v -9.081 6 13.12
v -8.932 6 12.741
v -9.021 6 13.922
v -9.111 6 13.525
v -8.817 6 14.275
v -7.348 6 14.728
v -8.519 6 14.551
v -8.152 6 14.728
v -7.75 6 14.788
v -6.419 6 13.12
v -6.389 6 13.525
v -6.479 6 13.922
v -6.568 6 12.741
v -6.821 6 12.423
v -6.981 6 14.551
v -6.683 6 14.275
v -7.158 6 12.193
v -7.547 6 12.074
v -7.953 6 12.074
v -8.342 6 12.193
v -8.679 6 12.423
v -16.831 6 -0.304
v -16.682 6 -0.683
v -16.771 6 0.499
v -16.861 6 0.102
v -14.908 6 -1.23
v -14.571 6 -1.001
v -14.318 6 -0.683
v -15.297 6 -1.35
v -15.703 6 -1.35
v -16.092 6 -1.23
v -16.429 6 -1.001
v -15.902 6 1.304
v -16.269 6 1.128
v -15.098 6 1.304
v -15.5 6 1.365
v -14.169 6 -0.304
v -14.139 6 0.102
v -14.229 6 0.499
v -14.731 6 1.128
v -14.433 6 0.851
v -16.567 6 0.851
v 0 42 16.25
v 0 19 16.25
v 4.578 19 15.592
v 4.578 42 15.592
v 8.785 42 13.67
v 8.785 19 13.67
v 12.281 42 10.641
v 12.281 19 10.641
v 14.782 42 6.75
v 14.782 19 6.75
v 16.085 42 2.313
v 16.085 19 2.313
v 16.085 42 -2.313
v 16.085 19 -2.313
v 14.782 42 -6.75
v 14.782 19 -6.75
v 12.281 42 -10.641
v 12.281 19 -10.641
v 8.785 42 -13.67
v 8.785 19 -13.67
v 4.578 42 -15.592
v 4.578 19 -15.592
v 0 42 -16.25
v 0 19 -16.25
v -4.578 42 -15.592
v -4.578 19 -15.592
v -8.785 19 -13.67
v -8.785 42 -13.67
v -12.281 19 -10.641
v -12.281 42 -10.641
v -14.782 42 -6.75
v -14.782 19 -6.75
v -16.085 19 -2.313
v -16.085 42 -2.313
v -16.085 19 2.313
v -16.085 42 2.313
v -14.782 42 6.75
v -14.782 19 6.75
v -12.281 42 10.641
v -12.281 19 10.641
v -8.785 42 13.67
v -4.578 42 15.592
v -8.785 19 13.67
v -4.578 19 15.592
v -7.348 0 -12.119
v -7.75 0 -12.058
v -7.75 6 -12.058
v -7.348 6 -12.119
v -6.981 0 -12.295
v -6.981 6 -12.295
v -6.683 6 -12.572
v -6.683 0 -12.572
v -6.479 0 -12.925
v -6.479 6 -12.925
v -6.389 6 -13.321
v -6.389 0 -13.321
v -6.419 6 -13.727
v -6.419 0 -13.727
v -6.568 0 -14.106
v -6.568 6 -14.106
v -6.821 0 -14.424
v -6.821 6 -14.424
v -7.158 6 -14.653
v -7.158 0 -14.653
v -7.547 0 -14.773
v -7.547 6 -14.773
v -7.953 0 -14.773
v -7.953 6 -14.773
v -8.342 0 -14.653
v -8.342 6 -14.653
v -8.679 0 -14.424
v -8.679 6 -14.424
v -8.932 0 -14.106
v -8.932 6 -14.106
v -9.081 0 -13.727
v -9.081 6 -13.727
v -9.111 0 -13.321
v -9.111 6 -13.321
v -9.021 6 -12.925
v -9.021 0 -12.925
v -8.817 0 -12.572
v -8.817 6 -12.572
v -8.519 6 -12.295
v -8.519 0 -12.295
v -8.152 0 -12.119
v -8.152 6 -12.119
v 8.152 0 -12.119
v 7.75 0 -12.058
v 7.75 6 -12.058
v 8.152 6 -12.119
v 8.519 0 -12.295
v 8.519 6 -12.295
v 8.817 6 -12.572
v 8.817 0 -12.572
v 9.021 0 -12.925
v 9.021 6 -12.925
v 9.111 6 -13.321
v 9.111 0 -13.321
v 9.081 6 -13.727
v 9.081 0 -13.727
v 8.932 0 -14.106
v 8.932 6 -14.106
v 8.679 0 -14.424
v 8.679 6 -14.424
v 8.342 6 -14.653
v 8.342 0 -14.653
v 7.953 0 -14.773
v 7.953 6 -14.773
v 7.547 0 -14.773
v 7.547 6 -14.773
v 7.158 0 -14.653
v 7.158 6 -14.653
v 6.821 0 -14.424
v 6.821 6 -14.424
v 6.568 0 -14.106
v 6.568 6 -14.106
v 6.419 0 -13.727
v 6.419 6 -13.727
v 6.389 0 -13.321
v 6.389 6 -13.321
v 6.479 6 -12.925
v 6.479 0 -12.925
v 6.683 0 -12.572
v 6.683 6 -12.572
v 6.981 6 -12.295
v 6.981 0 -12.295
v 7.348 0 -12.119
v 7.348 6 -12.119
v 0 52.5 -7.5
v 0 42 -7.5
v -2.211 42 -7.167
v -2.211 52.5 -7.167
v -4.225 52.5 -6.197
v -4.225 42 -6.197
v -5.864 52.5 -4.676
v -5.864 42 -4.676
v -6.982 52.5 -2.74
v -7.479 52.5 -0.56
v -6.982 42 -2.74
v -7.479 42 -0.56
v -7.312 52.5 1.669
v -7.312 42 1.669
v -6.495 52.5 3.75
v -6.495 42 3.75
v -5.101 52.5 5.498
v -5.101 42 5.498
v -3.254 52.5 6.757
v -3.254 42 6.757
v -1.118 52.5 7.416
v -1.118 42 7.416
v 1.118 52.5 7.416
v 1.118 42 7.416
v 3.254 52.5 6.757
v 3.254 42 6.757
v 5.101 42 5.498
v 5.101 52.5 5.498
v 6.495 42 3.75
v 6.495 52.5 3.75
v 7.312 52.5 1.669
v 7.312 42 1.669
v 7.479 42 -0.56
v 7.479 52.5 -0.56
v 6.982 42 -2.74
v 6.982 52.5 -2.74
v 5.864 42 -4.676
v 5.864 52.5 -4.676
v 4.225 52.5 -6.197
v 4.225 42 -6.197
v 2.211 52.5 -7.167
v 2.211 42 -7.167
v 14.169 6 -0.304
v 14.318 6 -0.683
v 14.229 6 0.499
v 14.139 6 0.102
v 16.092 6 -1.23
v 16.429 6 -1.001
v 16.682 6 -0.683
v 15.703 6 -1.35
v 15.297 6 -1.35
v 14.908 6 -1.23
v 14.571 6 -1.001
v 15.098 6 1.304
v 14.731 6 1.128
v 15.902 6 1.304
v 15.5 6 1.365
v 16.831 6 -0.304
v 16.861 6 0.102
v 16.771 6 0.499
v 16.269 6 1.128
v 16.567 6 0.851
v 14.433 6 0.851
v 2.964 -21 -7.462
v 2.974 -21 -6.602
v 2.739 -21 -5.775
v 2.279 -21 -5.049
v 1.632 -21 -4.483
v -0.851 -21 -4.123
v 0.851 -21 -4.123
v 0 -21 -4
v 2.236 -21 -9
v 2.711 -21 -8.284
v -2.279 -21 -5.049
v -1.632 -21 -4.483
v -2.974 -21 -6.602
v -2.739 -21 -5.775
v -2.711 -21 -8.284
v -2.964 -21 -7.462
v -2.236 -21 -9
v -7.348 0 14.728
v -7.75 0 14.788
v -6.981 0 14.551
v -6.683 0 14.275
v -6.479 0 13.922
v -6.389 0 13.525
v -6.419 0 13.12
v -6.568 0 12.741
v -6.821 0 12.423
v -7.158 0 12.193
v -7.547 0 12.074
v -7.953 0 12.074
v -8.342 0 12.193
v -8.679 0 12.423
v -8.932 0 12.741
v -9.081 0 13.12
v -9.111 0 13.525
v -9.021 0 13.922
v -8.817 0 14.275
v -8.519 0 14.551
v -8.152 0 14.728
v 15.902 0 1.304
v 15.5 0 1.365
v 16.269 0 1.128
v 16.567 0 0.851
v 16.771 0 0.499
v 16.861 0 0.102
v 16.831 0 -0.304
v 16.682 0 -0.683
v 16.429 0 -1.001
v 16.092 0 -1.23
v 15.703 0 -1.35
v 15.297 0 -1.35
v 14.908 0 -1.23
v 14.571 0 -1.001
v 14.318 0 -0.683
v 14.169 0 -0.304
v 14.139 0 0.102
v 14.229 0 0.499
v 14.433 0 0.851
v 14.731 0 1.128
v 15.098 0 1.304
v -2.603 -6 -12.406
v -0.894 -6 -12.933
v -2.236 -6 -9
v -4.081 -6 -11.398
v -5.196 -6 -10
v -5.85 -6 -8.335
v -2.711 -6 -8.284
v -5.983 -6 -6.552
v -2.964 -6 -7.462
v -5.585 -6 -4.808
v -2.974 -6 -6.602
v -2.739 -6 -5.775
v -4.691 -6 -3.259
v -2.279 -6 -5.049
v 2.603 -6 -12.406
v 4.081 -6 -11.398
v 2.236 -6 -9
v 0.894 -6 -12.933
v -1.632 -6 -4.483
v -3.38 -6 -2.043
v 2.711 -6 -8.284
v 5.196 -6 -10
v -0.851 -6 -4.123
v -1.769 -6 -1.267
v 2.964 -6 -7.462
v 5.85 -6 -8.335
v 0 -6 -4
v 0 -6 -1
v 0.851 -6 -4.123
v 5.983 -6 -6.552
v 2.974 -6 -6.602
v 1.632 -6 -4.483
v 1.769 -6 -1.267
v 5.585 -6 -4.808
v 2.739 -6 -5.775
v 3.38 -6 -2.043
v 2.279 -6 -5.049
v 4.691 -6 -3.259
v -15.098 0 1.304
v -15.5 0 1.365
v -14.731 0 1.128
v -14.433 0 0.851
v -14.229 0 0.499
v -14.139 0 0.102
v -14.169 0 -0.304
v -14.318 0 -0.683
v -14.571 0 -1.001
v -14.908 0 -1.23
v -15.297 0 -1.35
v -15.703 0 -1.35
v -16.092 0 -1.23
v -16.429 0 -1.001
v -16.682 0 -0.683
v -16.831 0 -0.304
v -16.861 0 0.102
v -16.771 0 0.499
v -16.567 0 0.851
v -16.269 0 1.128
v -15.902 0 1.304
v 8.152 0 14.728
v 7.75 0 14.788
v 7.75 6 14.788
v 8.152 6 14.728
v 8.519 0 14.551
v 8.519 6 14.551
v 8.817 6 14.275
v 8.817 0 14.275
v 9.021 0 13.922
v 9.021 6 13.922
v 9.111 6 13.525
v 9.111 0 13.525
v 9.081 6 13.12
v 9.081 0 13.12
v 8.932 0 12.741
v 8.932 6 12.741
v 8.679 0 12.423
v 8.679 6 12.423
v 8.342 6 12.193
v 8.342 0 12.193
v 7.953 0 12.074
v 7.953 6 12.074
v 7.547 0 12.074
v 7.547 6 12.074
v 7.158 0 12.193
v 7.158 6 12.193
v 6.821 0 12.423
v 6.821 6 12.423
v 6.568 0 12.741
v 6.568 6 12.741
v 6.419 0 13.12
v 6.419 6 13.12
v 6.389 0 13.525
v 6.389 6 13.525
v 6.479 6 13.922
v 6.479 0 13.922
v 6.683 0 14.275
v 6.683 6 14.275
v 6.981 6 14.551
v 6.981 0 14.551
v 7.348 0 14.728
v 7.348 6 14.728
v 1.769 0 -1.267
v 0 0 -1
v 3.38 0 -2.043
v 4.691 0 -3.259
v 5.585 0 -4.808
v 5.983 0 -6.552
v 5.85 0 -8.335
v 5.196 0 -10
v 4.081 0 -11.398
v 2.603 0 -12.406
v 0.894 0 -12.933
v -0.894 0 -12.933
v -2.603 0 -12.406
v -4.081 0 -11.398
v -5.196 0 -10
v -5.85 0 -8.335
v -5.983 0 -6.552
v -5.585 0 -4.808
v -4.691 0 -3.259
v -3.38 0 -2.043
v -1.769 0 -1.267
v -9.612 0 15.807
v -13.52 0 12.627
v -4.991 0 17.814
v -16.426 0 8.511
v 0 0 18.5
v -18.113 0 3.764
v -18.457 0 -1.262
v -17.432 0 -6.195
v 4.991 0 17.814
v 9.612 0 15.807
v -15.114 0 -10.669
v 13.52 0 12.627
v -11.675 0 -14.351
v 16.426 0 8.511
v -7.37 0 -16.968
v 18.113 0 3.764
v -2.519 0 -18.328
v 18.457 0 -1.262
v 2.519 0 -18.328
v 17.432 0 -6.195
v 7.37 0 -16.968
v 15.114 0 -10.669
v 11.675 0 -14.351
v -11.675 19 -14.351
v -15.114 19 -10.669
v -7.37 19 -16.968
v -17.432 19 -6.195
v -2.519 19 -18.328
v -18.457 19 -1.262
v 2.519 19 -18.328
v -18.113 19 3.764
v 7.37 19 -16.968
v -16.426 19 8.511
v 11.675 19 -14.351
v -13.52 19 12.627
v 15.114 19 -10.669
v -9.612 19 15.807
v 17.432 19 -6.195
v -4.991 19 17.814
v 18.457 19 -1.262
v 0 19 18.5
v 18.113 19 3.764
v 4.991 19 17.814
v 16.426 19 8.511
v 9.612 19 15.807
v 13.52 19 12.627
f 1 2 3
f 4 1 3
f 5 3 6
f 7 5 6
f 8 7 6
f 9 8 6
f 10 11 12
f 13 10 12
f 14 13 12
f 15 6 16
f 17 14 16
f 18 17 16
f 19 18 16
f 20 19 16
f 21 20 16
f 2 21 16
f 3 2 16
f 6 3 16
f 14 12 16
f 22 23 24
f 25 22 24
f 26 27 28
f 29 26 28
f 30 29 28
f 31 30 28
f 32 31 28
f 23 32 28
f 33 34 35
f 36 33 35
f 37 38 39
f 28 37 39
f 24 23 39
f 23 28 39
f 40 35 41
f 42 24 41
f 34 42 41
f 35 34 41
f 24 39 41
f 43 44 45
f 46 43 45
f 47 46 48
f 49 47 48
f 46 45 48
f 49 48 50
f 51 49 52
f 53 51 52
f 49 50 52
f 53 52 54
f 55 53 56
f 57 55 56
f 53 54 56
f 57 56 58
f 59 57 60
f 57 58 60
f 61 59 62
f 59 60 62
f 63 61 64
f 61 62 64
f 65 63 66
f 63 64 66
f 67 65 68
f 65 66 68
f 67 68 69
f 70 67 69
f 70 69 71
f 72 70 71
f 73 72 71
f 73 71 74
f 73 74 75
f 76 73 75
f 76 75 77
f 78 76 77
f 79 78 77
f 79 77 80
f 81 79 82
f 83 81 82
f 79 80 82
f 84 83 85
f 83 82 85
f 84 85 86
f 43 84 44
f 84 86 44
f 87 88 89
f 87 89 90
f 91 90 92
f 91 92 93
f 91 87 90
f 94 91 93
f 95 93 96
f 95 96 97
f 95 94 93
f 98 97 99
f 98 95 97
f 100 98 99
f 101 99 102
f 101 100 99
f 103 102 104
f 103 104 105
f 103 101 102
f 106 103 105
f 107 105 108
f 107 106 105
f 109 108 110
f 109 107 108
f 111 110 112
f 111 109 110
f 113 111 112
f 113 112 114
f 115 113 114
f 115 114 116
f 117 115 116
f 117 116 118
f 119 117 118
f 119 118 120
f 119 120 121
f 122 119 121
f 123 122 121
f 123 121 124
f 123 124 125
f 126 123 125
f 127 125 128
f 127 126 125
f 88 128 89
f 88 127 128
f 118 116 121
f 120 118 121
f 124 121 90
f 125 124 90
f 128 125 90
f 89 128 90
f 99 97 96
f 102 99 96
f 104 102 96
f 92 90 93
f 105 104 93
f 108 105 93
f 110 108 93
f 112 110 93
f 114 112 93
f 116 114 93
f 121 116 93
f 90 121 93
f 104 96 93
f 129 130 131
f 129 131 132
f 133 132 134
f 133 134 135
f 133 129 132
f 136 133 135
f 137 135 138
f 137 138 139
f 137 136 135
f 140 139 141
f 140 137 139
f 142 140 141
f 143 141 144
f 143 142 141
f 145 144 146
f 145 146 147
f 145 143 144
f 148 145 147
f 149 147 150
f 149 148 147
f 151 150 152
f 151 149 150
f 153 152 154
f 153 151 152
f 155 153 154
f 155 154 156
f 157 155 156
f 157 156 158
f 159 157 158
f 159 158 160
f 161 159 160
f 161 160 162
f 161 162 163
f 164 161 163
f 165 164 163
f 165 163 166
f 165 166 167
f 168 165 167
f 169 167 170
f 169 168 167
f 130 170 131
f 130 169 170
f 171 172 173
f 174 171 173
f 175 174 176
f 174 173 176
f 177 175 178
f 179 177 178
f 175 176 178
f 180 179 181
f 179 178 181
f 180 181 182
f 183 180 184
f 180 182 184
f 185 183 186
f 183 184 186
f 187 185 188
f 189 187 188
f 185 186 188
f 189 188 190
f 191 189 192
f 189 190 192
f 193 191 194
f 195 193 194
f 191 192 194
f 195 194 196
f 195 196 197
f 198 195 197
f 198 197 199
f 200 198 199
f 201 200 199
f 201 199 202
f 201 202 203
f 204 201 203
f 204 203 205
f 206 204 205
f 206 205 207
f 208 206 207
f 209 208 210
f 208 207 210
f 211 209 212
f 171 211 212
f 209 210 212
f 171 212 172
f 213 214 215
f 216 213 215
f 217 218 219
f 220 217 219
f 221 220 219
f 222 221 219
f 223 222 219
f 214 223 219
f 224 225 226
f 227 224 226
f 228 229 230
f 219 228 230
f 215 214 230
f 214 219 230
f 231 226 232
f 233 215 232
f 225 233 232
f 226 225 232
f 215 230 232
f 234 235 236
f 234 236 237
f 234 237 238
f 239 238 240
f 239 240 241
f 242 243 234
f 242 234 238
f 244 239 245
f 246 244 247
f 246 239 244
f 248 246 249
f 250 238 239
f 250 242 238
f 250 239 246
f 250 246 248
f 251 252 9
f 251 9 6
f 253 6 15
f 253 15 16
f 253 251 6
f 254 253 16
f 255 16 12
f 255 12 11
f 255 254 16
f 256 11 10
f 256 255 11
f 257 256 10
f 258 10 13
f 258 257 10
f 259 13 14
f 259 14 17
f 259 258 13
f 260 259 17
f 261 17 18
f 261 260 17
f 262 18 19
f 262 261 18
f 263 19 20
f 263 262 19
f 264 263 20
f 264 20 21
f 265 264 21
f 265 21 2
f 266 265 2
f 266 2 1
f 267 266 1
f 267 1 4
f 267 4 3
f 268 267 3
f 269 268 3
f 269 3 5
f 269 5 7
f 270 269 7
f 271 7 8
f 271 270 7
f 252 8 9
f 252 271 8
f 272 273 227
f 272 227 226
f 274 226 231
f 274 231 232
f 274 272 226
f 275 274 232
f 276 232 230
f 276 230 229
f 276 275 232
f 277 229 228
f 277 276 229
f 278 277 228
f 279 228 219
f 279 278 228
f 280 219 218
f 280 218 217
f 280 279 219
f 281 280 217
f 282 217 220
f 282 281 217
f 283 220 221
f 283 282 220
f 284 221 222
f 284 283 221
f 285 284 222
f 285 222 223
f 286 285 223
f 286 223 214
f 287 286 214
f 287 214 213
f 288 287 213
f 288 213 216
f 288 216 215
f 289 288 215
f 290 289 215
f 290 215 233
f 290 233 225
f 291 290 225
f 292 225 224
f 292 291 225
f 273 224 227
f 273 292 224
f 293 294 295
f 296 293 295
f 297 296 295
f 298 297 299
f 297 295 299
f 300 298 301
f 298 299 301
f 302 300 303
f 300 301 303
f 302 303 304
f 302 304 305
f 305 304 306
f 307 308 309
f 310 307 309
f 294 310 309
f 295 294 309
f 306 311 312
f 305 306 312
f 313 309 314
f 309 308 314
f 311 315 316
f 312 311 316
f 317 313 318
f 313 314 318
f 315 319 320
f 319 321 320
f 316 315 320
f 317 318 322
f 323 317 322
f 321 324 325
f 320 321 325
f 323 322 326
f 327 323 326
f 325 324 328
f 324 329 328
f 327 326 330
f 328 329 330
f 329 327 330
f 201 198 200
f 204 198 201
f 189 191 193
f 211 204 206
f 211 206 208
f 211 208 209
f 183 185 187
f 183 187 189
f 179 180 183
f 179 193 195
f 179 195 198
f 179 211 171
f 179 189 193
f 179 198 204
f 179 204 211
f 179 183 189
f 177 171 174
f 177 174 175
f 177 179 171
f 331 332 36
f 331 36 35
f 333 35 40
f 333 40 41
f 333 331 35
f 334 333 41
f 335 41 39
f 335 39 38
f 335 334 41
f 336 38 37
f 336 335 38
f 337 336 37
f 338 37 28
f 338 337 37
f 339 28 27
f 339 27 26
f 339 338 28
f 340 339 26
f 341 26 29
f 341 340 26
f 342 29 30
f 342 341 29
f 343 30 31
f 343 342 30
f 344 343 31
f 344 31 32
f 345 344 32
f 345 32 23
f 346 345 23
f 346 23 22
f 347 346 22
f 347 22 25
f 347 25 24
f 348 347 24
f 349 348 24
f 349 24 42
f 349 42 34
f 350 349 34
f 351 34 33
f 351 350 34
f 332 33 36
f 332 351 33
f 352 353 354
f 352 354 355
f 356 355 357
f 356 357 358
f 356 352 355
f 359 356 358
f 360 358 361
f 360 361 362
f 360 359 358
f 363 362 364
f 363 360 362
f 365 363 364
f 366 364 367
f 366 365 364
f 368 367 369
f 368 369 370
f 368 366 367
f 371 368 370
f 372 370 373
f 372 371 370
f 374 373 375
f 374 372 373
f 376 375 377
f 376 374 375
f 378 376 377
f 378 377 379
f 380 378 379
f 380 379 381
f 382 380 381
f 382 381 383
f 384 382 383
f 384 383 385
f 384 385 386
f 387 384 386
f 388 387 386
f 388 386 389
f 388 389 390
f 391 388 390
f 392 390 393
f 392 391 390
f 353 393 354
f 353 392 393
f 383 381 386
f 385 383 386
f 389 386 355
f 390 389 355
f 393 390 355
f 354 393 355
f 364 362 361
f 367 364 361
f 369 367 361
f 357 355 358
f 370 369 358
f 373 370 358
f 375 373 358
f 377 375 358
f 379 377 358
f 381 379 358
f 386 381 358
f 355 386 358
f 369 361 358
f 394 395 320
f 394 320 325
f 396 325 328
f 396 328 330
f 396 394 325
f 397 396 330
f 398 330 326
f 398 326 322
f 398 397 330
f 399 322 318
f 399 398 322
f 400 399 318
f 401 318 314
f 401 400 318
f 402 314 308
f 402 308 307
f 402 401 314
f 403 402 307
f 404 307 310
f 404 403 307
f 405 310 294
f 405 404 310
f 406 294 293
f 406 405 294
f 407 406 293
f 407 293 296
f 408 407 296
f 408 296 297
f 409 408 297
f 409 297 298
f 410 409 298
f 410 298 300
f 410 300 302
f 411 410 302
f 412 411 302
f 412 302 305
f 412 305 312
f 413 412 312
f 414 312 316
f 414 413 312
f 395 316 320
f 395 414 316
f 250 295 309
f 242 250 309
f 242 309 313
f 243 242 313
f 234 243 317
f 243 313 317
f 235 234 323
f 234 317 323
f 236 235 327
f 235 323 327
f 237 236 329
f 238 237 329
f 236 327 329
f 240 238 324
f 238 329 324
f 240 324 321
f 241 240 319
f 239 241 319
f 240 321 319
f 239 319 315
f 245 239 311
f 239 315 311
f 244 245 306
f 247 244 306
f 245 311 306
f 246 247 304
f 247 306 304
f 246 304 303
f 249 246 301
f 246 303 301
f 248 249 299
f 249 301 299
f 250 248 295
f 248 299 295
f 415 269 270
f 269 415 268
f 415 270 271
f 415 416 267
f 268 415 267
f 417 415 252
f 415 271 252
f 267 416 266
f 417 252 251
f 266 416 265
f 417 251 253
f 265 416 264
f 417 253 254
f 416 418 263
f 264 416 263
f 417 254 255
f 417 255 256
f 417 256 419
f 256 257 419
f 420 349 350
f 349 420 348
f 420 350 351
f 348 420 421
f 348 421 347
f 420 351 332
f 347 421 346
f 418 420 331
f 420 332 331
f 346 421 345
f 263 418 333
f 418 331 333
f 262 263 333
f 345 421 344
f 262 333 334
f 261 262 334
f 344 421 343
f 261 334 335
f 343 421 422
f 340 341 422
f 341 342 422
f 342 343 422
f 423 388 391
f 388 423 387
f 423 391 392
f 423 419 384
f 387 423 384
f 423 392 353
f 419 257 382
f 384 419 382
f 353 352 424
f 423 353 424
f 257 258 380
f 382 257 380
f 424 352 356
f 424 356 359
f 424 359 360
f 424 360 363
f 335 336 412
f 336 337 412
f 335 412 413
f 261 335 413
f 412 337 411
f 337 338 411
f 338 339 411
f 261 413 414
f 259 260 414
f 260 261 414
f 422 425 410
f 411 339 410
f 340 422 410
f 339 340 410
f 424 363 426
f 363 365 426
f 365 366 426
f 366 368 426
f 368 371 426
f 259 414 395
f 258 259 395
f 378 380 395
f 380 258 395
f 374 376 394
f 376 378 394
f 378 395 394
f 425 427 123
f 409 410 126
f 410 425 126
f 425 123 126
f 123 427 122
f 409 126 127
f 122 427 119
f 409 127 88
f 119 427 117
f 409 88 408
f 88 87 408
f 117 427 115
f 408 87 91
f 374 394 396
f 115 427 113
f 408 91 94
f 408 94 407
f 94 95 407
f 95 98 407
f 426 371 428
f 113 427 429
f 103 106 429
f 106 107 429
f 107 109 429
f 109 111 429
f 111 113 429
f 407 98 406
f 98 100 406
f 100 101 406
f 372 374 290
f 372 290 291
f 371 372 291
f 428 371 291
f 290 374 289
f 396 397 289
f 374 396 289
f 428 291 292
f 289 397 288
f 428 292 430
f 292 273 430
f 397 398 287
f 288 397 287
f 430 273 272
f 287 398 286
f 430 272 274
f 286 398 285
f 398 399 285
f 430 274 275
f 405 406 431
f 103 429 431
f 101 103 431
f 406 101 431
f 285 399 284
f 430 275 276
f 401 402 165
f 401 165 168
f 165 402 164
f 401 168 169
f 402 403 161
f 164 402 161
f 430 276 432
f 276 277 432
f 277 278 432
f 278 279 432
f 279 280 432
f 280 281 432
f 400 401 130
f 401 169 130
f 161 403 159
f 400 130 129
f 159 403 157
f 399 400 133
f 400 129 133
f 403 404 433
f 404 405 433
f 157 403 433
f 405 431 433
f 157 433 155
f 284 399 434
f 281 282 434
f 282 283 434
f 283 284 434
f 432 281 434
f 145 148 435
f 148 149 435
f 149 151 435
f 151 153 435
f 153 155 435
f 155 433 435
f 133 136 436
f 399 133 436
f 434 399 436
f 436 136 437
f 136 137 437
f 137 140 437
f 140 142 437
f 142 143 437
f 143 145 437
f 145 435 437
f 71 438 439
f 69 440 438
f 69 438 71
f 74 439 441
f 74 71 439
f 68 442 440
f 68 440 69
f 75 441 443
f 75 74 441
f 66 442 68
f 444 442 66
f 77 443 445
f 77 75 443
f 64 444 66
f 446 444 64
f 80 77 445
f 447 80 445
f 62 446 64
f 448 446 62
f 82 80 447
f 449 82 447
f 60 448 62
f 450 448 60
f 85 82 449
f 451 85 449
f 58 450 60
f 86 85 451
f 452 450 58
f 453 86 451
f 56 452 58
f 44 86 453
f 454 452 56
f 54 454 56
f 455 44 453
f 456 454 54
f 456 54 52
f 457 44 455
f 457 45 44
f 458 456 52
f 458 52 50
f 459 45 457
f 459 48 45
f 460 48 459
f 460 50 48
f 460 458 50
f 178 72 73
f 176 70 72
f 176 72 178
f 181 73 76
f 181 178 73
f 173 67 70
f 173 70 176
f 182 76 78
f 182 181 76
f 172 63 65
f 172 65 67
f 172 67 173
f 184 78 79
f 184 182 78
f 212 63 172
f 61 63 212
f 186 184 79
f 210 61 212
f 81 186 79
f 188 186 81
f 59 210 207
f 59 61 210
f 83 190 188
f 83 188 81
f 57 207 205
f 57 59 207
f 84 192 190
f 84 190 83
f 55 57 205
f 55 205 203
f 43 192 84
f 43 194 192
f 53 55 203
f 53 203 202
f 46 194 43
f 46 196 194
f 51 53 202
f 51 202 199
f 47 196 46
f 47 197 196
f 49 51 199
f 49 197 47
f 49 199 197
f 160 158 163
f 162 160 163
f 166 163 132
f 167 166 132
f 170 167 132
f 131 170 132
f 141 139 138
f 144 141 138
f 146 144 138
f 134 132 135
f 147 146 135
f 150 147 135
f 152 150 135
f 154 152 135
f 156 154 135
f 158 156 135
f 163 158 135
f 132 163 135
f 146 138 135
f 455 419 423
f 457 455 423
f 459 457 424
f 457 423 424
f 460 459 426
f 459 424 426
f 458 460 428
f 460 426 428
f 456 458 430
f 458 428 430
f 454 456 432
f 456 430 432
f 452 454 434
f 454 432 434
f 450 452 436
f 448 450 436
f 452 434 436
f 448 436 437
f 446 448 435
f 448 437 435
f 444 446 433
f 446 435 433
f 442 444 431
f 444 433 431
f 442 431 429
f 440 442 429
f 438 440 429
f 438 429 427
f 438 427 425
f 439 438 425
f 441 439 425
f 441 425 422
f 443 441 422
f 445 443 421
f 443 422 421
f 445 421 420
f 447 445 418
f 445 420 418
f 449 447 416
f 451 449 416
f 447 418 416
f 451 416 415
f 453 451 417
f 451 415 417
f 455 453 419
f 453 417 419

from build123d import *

# Parameters (mm, degrees)
SKETCH_1_R          = 18.5
EXTRUDE_4_DEPTH     = 19
SKETCH_1_4_R        = 6
EXTRUDE_5_DEPTH     = 6
EXTRUDE_6_DEPTH     = 21
SKETCH_1_6_R        = 1.365103645
CUT_EXTRUDE_2_DEPTH = 6
SKETCH_5_R          = 16.25
EXTRUDE_8_DEPTH     = 23
SKETCH_6_R          = 7.5
EXTRUDE_10_DEPTH    = 10.5


with BuildPart() as part:
    # 草图1 → 凸台-拉伸4 (new body)
    with BuildSketch(Plane(origin=(0, 0, 0), x_dir=(1, 0, 0), z_dir=(0, 1, 0))):
        Circle(SKETCH_1_R)
    extrude(amount=EXTRUDE_4_DEPTH)

    # 草图1<4> → 凸台-拉伸5 (add)
    with BuildSketch(Plane(origin=(0, 0, 0), x_dir=(1, 0, 0), z_dir=(0, 1, 0))):
        with Locations((0, 7)):
            Circle(SKETCH_1_4_R)
    extrude(amount=-EXTRUDE_5_DEPTH)

    # 草图1<5> → 凸台-拉伸6 (add)
    with BuildSketch(Plane(origin=(0, 0, 0), x_dir=(1, 0, 0), z_dir=(0, 1, 0))):
        with BuildLine():
            Line((-2.236067977, 9), (2.236067977, 9))
            ThreePointArc((2.236067977, 9), (0, 4), (-2.236067977, 9))
        make_face()
    extrude(amount=-EXTRUDE_6_DEPTH)

    # 草图1<6> → 切除-拉伸2 (cut)
    with BuildSketch(Plane(origin=(0, 0, 0), x_dir=(1, 0, 0), z_dir=(0, 1, 0))):
        with Locations((-15.5, 0)):
            Circle(SKETCH_1_6_R)
        with Locations((-7.75, 13.423393759)):
            Circle(SKETCH_1_6_R)
        with Locations((7.75, 13.423393759)):
            Circle(SKETCH_1_6_R)
        with Locations((15.5, 0)):
            Circle(SKETCH_1_6_R)
        with Locations((7.75, -13.423393759)):
            Circle(SKETCH_1_6_R)
        with Locations((-7.75, -13.423393759)):
            Circle(SKETCH_1_6_R)
    extrude(amount=CUT_EXTRUDE_2_DEPTH, mode=Mode.SUBTRACT)

    # 草图5 → 凸台-拉伸8 (add)
    with BuildSketch(Plane(origin=(0, 19, 0), x_dir=(1, 0, 0), z_dir=(0, 1, 0))):
        Circle(SKETCH_5_R)
    extrude(amount=EXTRUDE_8_DEPTH)

    # 草图6 → 凸台-拉伸10 (add)
    with BuildSketch(Plane(origin=(0, 42, 0), x_dir=(1, 0, 0), z_dir=(0, 1, 0))):
        Circle(SKETCH_6_R)
    extrude(amount=EXTRUDE_10_DEPTH)


solid = part.part
